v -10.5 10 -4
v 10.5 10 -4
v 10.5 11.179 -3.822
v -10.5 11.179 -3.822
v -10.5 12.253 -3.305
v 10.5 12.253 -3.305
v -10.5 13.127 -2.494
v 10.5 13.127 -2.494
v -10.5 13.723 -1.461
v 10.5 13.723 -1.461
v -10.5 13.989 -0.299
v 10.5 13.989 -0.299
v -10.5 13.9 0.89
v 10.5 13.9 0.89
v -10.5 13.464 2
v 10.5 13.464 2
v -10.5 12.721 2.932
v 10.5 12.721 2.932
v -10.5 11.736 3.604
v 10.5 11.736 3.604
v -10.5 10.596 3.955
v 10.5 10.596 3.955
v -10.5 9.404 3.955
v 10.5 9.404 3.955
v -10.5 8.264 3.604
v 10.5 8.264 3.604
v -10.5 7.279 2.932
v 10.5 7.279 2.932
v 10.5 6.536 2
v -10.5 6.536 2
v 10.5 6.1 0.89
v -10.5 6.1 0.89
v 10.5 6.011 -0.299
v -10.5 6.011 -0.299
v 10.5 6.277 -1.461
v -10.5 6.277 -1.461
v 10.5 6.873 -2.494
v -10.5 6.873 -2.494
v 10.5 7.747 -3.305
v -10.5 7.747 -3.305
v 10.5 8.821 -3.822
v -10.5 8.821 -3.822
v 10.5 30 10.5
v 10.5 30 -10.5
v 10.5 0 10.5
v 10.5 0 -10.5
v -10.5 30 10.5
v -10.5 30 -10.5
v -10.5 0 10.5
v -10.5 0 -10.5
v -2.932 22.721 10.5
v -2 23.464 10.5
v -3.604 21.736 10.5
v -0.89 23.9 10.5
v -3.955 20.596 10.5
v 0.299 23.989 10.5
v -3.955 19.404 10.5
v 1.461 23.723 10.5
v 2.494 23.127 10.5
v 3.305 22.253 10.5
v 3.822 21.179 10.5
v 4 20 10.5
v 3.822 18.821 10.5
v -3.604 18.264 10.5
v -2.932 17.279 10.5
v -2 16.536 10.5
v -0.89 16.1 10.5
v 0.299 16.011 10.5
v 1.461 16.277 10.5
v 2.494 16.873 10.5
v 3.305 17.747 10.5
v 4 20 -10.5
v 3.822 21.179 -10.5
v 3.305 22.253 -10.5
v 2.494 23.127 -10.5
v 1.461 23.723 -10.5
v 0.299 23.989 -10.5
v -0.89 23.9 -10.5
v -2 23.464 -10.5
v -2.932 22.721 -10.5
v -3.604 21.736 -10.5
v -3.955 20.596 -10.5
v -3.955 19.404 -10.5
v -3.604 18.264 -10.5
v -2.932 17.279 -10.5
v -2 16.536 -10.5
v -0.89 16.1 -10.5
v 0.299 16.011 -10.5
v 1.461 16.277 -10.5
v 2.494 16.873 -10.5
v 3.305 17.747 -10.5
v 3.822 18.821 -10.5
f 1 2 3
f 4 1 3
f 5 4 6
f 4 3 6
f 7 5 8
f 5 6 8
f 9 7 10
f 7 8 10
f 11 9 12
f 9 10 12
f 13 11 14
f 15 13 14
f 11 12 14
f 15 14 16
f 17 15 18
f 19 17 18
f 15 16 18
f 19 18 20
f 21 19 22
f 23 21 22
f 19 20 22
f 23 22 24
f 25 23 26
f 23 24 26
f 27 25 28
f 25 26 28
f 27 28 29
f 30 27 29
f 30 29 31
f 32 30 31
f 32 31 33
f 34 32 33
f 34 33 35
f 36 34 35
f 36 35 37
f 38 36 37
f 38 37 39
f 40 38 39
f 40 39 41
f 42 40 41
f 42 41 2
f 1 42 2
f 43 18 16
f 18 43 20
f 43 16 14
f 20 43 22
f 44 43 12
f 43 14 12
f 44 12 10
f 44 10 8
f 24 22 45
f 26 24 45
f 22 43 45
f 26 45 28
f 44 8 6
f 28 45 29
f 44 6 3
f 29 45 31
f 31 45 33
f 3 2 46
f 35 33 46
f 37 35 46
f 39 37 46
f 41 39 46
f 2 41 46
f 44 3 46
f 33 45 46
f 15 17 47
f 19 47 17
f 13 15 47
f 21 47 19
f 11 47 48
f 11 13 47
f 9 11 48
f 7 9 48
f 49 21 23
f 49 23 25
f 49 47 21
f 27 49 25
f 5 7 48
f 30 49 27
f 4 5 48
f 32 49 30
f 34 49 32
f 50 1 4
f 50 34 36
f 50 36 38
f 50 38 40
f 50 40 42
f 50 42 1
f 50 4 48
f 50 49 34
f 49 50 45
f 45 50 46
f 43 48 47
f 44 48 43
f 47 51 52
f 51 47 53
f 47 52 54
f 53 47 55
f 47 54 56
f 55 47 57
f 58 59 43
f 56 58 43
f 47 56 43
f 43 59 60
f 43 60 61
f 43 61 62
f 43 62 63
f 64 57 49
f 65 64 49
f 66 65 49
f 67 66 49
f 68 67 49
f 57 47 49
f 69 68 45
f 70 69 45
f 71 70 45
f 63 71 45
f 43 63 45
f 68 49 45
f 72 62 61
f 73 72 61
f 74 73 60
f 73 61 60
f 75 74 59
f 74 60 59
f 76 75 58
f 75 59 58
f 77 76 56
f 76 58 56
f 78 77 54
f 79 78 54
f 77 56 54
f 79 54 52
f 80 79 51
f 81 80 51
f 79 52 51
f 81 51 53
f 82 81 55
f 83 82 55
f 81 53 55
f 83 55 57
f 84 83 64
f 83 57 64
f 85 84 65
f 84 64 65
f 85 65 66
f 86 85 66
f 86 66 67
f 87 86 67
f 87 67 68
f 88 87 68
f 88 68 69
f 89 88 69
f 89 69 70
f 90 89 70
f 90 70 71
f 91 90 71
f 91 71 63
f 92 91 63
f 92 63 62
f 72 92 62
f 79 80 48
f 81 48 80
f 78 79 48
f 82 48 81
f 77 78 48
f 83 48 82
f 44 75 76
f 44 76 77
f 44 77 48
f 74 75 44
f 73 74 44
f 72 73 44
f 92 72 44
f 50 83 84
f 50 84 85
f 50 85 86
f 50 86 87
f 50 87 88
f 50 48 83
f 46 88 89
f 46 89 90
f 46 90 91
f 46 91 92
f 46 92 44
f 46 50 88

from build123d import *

# Parameters (mm, degrees)
SKETCH1_W           = 21
SKETCH1_H           = 21
BOSS_EXTRUDE1_DEPTH = 30
SKETCH2_R           = 4
CUT_EXTRUDE1_DEPTH  = 39.095275298
SKETCH3_R           = 4
CUT_EXTRUDE2_DEPTH  = 39.095275298


with BuildPart() as part:
    # Sketch1 → Boss-Extrude1 (new body)
    with BuildSketch(Plane(origin=(0, 0, 0), x_dir=(1, 0, 0), z_dir=(0, 1, 0))):
        Rectangle(SKETCH1_W, SKETCH1_H)
    extrude(amount=BOSS_EXTRUDE1_DEPTH)

    # Sketch2 → Cut-Extrude1 (cut, through all)
    with BuildSketch(Plane.XY.offset(10.5)):
        with Locations((0, 20)):
            Circle(SKETCH2_R)
    extrude(amount=-CUT_EXTRUDE1_DEPTH, mode=Mode.SUBTRACT)

    # Sketch3 → Cut-Extrude2 (cut, through all)
    with BuildSketch(Plane(origin=(10.5, 0, 0), x_dir=(0, 0, -1), z_dir=(1, 0, 0))):
        with Locations((0, 10)):
            Circle(SKETCH3_R)
    extrude(amount=-CUT_EXTRUDE2_DEPTH, mode=Mode.SUBTRACT)


solid = part.part
